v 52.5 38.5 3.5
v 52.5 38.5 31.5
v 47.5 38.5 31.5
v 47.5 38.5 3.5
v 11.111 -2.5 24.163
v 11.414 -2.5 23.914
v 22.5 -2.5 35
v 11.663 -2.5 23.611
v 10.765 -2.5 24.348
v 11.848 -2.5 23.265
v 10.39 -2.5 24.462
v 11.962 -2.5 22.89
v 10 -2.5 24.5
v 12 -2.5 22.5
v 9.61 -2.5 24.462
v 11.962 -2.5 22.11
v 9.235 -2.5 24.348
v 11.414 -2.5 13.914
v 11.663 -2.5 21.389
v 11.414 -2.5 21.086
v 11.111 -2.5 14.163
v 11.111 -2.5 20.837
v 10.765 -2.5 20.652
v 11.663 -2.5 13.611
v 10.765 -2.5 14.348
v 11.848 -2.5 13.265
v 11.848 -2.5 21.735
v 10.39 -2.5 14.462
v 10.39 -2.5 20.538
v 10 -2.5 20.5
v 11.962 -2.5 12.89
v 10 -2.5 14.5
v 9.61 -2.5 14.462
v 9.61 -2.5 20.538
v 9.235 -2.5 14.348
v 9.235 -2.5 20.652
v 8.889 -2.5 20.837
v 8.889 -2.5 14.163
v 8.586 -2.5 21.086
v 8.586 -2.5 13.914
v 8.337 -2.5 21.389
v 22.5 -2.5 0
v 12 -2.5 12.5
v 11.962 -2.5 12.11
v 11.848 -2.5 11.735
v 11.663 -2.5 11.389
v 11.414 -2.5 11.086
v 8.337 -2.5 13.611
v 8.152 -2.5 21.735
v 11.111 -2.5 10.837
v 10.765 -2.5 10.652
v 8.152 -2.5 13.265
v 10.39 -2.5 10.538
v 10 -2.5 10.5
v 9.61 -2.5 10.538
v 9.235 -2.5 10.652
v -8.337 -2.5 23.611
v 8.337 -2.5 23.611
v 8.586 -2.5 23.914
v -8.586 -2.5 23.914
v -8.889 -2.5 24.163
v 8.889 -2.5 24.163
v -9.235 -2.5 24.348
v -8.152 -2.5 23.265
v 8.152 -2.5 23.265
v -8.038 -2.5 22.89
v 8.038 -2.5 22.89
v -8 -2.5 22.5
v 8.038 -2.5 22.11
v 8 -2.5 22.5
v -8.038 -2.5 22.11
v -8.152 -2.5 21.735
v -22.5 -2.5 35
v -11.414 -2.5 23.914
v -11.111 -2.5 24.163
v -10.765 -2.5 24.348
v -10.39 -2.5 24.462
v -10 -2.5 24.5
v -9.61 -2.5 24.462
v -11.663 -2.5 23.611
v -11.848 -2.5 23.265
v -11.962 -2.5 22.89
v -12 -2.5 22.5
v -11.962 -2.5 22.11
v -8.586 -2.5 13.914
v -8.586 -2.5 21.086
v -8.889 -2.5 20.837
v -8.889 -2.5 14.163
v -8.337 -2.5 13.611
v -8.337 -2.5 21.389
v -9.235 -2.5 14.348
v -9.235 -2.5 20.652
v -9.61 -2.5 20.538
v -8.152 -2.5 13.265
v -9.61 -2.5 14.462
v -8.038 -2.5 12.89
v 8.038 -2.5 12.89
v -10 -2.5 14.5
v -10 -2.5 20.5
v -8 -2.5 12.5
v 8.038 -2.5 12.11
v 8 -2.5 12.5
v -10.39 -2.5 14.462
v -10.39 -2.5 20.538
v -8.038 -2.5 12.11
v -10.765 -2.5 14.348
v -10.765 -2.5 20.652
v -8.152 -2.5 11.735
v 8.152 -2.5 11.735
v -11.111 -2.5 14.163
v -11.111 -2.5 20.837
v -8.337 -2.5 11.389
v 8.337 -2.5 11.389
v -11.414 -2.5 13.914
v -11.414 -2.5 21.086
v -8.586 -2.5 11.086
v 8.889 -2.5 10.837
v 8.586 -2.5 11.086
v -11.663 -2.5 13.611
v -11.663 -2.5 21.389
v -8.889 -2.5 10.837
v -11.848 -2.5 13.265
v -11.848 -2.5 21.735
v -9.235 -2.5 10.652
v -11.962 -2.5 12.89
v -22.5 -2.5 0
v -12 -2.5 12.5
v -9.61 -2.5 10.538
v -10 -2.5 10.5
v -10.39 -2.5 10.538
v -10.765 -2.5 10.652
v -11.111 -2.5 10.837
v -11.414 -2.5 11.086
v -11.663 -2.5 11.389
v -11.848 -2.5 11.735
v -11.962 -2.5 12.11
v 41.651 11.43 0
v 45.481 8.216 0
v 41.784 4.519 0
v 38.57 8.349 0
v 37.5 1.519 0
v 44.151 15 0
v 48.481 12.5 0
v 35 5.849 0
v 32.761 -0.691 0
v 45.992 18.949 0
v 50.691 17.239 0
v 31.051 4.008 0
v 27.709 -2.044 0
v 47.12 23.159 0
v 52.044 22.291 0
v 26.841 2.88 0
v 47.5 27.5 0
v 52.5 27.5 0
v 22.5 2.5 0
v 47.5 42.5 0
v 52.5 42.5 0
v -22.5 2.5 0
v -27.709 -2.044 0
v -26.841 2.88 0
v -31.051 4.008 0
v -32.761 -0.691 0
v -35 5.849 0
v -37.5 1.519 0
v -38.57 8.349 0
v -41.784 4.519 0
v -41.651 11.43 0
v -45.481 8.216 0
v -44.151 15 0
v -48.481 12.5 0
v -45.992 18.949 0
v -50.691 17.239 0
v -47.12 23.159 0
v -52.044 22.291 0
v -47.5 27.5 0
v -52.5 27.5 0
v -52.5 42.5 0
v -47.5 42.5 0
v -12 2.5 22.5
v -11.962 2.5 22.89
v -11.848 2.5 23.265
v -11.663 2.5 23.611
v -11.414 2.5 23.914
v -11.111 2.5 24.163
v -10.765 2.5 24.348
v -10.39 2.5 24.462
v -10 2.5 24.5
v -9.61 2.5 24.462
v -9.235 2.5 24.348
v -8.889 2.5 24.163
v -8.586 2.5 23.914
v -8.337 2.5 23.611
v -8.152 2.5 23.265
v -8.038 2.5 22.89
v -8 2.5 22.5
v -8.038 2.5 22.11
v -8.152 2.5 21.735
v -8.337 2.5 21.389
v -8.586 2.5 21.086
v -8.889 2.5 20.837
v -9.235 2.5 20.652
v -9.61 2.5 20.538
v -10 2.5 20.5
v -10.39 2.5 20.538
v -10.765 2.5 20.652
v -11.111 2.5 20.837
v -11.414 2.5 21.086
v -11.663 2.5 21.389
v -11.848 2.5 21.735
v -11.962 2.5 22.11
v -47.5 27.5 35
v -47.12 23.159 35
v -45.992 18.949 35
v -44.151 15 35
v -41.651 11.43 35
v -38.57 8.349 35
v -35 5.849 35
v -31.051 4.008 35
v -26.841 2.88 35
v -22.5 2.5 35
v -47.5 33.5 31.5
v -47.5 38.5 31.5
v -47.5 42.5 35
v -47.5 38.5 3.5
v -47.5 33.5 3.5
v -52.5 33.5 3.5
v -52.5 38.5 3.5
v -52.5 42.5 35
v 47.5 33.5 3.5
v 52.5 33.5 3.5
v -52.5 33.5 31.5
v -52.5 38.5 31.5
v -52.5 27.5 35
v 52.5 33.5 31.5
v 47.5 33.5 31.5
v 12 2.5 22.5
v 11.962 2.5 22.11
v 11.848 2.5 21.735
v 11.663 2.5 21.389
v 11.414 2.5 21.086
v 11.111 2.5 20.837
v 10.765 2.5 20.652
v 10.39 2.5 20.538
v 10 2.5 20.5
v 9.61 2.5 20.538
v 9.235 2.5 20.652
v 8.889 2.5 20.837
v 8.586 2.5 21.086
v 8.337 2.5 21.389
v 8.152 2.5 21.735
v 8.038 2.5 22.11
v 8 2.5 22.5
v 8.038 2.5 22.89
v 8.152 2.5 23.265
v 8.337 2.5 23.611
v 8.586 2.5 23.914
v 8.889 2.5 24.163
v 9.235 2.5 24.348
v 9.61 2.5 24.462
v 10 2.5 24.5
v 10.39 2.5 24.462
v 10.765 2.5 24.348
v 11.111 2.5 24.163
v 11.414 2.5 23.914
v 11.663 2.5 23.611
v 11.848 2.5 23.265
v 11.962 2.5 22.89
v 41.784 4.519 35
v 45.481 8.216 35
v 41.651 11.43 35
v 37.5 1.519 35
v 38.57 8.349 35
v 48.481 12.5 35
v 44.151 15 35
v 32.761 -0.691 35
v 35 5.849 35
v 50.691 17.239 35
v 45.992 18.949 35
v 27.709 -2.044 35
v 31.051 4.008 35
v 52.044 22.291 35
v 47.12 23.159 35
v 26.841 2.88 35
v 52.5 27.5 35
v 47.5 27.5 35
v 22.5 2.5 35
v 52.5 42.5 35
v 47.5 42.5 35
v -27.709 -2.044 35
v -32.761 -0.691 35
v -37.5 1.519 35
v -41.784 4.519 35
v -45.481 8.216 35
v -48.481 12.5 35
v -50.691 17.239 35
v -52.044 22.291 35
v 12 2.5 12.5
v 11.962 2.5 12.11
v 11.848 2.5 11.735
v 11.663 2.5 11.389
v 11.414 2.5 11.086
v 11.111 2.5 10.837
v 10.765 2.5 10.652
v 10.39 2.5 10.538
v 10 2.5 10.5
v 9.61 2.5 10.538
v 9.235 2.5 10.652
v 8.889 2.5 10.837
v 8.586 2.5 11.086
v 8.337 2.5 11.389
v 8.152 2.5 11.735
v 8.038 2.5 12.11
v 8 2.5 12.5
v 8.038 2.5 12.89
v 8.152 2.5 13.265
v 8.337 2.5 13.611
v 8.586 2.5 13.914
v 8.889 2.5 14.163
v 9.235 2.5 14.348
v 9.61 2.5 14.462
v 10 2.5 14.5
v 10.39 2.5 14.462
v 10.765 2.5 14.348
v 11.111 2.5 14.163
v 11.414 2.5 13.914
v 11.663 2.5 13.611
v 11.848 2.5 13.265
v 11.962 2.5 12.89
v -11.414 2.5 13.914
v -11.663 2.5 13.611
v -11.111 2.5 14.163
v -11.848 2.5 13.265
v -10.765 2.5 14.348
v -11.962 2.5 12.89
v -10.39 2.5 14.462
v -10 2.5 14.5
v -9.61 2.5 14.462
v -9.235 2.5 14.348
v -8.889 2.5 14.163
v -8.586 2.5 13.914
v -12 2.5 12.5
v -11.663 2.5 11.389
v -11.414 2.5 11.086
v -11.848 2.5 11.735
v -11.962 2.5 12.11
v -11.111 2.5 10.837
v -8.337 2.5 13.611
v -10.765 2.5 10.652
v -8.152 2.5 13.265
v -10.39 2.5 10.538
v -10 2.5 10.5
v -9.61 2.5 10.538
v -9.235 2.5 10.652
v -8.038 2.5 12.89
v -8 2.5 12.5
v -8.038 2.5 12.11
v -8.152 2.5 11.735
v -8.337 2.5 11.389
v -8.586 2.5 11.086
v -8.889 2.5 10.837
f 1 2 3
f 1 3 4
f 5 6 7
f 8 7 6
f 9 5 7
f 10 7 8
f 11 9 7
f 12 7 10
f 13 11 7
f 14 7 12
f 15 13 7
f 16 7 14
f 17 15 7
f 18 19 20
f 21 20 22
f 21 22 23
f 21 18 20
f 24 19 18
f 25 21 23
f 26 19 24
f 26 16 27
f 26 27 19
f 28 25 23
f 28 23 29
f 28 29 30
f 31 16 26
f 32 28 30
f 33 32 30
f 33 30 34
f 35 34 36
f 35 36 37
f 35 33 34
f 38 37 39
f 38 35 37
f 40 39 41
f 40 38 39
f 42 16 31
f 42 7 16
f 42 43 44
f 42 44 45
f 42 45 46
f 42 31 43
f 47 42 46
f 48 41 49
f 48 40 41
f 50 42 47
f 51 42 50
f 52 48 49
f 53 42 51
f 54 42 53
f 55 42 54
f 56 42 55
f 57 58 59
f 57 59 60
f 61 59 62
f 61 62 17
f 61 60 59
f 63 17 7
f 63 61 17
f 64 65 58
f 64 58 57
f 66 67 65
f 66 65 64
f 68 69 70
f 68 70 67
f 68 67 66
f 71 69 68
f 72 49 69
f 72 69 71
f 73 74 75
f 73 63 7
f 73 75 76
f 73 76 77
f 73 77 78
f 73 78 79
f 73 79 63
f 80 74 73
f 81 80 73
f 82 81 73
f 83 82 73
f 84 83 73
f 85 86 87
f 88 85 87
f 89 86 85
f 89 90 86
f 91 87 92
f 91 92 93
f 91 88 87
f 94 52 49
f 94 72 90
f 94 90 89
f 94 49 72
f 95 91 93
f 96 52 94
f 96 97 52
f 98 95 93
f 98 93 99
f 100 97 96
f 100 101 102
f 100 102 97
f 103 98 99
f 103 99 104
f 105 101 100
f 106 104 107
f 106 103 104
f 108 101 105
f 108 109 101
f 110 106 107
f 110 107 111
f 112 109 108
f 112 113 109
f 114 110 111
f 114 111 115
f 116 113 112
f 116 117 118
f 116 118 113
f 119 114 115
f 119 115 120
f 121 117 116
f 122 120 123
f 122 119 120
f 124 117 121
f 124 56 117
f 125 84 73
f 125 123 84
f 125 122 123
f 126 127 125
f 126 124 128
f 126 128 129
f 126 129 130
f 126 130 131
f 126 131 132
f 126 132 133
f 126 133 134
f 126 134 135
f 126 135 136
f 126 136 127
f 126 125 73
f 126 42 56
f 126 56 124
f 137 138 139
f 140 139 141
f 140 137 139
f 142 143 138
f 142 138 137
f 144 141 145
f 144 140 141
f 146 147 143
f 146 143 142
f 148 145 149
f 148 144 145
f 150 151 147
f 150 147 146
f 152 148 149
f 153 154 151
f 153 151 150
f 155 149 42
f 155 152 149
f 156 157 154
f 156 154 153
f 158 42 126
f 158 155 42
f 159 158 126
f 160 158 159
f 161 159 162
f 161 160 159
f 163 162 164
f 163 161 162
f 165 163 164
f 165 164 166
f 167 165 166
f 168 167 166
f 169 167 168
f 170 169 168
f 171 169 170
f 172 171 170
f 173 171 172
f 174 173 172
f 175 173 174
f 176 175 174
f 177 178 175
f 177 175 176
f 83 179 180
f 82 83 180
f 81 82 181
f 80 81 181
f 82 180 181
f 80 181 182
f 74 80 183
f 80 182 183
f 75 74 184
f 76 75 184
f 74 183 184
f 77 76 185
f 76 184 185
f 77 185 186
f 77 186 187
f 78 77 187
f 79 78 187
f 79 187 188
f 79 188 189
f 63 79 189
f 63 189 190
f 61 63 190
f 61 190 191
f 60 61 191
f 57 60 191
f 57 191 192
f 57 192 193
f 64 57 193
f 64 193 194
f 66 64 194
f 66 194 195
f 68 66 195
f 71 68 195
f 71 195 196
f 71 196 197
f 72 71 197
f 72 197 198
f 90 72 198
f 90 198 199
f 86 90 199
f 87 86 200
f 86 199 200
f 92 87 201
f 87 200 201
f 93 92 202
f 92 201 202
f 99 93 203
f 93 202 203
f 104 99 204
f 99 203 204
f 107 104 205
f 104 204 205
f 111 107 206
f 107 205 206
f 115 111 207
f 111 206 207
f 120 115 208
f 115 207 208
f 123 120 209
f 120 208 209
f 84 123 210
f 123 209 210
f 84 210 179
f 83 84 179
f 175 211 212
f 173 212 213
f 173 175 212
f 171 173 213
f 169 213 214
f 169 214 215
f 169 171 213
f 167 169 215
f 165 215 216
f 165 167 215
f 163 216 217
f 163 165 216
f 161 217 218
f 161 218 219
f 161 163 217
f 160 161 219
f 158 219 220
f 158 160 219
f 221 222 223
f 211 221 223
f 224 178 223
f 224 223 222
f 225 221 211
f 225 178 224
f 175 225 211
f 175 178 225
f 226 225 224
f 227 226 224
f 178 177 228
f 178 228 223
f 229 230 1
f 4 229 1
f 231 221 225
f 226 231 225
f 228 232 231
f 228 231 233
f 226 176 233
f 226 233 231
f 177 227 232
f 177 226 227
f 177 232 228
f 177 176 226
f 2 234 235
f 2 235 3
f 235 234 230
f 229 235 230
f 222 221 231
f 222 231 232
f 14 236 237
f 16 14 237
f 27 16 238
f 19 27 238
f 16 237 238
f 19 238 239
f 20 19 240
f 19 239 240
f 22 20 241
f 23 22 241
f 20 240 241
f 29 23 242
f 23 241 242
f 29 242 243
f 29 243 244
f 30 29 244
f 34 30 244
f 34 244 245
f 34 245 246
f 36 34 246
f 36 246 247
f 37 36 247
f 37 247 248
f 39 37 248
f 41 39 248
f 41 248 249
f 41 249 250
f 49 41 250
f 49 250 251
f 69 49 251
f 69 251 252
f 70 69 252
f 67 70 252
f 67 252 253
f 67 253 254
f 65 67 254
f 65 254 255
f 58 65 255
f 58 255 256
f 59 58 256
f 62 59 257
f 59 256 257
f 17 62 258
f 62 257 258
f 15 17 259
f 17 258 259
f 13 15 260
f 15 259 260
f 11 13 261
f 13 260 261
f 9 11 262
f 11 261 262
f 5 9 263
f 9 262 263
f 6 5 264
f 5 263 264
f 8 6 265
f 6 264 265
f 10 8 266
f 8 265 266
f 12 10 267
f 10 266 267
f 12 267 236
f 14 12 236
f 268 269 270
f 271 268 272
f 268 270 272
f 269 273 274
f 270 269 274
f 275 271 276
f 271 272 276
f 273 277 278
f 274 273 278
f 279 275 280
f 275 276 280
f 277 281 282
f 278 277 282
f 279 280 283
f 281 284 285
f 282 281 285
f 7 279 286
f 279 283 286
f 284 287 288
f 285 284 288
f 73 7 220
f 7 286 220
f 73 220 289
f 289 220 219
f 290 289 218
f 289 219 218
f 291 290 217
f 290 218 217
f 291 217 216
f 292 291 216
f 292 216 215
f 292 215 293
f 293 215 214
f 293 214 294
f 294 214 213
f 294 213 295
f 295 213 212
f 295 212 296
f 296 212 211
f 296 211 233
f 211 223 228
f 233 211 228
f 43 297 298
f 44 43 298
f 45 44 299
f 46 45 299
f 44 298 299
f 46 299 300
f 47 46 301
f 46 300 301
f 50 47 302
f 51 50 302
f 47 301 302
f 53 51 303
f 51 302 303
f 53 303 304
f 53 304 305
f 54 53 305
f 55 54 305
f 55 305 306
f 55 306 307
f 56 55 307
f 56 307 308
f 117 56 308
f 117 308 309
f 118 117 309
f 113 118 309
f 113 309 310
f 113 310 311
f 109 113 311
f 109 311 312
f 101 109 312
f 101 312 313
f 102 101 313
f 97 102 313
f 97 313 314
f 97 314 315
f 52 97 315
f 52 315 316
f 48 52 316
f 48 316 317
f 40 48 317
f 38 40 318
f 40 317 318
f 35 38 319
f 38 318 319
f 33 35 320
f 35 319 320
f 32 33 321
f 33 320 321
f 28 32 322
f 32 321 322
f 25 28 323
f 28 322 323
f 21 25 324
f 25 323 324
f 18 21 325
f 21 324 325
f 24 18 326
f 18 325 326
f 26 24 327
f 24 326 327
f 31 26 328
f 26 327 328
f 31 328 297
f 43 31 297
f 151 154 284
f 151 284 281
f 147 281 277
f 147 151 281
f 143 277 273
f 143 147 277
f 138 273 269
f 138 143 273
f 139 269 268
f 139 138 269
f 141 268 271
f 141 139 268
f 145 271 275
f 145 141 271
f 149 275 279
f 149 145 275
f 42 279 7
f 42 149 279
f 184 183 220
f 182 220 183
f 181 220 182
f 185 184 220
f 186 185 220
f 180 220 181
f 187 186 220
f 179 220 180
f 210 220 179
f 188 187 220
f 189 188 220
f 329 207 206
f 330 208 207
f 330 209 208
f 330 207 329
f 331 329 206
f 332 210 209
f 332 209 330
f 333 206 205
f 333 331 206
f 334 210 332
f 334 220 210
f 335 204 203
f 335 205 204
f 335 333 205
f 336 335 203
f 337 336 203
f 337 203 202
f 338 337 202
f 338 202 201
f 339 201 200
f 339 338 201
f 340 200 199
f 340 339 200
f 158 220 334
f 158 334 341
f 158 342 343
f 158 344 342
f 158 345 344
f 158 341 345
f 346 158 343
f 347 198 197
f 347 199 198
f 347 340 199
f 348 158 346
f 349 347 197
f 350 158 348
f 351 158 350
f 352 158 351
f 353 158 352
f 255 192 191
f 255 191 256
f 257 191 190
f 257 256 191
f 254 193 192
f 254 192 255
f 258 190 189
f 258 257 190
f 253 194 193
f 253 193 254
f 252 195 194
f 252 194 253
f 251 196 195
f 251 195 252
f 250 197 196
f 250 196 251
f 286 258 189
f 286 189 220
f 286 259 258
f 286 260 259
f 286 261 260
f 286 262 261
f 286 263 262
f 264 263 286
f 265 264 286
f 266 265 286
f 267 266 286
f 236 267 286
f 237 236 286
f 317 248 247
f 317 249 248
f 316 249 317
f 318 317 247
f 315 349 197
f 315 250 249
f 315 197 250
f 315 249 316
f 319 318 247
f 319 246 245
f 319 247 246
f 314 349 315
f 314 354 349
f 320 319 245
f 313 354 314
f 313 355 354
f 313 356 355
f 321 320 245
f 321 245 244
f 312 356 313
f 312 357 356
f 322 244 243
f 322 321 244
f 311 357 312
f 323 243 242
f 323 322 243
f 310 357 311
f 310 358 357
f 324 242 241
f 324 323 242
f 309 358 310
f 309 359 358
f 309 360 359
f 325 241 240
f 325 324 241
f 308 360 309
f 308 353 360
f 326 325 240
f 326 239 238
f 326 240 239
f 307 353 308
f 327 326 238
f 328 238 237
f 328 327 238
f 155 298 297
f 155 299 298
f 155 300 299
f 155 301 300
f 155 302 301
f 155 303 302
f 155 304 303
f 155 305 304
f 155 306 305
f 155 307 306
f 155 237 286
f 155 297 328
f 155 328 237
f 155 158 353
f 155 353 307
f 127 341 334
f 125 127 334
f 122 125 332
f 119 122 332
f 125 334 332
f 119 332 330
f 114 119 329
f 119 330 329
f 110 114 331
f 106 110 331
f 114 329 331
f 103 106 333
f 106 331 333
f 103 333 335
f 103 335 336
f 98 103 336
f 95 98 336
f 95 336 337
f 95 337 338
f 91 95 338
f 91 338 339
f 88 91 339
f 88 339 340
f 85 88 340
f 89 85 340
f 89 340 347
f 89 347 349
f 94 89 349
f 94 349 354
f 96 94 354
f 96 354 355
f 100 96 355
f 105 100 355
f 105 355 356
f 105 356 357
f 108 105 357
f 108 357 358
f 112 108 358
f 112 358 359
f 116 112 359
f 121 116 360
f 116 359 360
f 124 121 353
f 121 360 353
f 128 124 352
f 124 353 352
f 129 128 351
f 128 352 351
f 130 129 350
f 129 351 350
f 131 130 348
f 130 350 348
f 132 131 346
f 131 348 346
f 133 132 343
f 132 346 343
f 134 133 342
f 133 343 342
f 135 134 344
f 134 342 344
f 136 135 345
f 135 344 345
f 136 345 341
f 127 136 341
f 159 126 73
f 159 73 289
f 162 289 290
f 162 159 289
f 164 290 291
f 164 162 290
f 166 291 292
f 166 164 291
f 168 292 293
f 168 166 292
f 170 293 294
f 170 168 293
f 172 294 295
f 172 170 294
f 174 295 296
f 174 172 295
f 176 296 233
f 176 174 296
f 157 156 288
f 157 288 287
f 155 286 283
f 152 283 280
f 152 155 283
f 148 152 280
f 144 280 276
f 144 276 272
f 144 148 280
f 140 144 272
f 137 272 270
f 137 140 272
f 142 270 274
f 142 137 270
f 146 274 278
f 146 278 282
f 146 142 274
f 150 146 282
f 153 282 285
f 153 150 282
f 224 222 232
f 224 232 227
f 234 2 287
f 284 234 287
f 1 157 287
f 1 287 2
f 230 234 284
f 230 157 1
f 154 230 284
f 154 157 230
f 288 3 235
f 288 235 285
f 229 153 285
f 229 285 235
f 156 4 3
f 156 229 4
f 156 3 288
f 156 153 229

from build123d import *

# Parameters (mm, degrees)
EXTRUDE_1_DEPTH     = 35
SKETCH_3_W          = 28
SKETCH_3_H          = 5
CUT_EXTRUDE_1_DEPTH = 119.559064219
SKETCH_4_R          = 2
CUT_EXTRUDE_2_DEPTH = 75.707768298


with BuildPart() as part:
    # 草图1 → 凸台-拉伸1 (new body)
    with BuildSketch(Plane.XY):
        with BuildLine():
            Line((-52.500003752, 27.500001563), (-52.500003752, 42.500001563))
            Line((-52.500003752, 42.500001563), (-47.500003752, 42.500001563))
            Line((-47.500003752, 42.500001563), (-47.500003752, 27.500001563))
            ThreePointArc((-47.500003752, 27.500001563), (-40.17767174, 9.822329823), (-22.5, 2.499998437))
            Line((-22.5, 2.499998437), (22.5, 2.499998437))
            ThreePointArc((22.5, 2.499998437), (40.17767174, 9.822329823), (47.500003752, 27.500001563))
            Line((47.500003752, 27.500001563), (47.500003752, 42.500001563))
            Line((47.500003752, 42.500001563), (52.500003752, 42.500001563))
            Line((52.500003752, 42.500001563), (52.500003752, 27.500001563))
            ThreePointArc((52.500003752, 27.500001563), (43.713203436, 6.286798128), (22.5, -2.499998437))
            Line((22.5, -2.499998437), (-22.5, -2.499998437))
            ThreePointArc((-22.5, -2.499998437), (-43.713203436, 6.286798128), (-52.500003752, 27.500001563))
        make_face()
    extrude(amount=EXTRUDE_1_DEPTH)

    # 草图3 → 切除-拉伸1 (cut, through all)
    with BuildSketch(Plane(origin=(52.500003752, 0, 0), x_dir=(0, 0, -1), z_dir=(1, 0, 0))):
        with Locations((-17.5, 36.000001563)):
            Rectangle(SKETCH_3_W, SKETCH_3_H)
    extrude(amount=-CUT_EXTRUDE_1_DEPTH, mode=Mode.SUBTRACT)

    # 草图4 → 切除-拉伸2 (cut, through all)
    with BuildSketch(Plane(origin=(0, 2.499998437, 0), x_dir=(1, 0, 0), z_dir=(0, 1, 0))):
        with Locations(Location((-10, -12.5, 0), (0, 0, 180))):
            Circle(SKETCH_4_R)
        with Locations(Location((-10, -22.5, 0), (0, 0, 180))):
            Circle(SKETCH_4_R)
        with Locations((10, -22.5)):
            Circle(SKETCH_4_R)
        with Locations((10, -12.5)):
            Circle(SKETCH_4_R)
    extrude(amount=-CUT_EXTRUDE_2_DEPTH, mode=Mode.SUBTRACT)


solid = part.part
